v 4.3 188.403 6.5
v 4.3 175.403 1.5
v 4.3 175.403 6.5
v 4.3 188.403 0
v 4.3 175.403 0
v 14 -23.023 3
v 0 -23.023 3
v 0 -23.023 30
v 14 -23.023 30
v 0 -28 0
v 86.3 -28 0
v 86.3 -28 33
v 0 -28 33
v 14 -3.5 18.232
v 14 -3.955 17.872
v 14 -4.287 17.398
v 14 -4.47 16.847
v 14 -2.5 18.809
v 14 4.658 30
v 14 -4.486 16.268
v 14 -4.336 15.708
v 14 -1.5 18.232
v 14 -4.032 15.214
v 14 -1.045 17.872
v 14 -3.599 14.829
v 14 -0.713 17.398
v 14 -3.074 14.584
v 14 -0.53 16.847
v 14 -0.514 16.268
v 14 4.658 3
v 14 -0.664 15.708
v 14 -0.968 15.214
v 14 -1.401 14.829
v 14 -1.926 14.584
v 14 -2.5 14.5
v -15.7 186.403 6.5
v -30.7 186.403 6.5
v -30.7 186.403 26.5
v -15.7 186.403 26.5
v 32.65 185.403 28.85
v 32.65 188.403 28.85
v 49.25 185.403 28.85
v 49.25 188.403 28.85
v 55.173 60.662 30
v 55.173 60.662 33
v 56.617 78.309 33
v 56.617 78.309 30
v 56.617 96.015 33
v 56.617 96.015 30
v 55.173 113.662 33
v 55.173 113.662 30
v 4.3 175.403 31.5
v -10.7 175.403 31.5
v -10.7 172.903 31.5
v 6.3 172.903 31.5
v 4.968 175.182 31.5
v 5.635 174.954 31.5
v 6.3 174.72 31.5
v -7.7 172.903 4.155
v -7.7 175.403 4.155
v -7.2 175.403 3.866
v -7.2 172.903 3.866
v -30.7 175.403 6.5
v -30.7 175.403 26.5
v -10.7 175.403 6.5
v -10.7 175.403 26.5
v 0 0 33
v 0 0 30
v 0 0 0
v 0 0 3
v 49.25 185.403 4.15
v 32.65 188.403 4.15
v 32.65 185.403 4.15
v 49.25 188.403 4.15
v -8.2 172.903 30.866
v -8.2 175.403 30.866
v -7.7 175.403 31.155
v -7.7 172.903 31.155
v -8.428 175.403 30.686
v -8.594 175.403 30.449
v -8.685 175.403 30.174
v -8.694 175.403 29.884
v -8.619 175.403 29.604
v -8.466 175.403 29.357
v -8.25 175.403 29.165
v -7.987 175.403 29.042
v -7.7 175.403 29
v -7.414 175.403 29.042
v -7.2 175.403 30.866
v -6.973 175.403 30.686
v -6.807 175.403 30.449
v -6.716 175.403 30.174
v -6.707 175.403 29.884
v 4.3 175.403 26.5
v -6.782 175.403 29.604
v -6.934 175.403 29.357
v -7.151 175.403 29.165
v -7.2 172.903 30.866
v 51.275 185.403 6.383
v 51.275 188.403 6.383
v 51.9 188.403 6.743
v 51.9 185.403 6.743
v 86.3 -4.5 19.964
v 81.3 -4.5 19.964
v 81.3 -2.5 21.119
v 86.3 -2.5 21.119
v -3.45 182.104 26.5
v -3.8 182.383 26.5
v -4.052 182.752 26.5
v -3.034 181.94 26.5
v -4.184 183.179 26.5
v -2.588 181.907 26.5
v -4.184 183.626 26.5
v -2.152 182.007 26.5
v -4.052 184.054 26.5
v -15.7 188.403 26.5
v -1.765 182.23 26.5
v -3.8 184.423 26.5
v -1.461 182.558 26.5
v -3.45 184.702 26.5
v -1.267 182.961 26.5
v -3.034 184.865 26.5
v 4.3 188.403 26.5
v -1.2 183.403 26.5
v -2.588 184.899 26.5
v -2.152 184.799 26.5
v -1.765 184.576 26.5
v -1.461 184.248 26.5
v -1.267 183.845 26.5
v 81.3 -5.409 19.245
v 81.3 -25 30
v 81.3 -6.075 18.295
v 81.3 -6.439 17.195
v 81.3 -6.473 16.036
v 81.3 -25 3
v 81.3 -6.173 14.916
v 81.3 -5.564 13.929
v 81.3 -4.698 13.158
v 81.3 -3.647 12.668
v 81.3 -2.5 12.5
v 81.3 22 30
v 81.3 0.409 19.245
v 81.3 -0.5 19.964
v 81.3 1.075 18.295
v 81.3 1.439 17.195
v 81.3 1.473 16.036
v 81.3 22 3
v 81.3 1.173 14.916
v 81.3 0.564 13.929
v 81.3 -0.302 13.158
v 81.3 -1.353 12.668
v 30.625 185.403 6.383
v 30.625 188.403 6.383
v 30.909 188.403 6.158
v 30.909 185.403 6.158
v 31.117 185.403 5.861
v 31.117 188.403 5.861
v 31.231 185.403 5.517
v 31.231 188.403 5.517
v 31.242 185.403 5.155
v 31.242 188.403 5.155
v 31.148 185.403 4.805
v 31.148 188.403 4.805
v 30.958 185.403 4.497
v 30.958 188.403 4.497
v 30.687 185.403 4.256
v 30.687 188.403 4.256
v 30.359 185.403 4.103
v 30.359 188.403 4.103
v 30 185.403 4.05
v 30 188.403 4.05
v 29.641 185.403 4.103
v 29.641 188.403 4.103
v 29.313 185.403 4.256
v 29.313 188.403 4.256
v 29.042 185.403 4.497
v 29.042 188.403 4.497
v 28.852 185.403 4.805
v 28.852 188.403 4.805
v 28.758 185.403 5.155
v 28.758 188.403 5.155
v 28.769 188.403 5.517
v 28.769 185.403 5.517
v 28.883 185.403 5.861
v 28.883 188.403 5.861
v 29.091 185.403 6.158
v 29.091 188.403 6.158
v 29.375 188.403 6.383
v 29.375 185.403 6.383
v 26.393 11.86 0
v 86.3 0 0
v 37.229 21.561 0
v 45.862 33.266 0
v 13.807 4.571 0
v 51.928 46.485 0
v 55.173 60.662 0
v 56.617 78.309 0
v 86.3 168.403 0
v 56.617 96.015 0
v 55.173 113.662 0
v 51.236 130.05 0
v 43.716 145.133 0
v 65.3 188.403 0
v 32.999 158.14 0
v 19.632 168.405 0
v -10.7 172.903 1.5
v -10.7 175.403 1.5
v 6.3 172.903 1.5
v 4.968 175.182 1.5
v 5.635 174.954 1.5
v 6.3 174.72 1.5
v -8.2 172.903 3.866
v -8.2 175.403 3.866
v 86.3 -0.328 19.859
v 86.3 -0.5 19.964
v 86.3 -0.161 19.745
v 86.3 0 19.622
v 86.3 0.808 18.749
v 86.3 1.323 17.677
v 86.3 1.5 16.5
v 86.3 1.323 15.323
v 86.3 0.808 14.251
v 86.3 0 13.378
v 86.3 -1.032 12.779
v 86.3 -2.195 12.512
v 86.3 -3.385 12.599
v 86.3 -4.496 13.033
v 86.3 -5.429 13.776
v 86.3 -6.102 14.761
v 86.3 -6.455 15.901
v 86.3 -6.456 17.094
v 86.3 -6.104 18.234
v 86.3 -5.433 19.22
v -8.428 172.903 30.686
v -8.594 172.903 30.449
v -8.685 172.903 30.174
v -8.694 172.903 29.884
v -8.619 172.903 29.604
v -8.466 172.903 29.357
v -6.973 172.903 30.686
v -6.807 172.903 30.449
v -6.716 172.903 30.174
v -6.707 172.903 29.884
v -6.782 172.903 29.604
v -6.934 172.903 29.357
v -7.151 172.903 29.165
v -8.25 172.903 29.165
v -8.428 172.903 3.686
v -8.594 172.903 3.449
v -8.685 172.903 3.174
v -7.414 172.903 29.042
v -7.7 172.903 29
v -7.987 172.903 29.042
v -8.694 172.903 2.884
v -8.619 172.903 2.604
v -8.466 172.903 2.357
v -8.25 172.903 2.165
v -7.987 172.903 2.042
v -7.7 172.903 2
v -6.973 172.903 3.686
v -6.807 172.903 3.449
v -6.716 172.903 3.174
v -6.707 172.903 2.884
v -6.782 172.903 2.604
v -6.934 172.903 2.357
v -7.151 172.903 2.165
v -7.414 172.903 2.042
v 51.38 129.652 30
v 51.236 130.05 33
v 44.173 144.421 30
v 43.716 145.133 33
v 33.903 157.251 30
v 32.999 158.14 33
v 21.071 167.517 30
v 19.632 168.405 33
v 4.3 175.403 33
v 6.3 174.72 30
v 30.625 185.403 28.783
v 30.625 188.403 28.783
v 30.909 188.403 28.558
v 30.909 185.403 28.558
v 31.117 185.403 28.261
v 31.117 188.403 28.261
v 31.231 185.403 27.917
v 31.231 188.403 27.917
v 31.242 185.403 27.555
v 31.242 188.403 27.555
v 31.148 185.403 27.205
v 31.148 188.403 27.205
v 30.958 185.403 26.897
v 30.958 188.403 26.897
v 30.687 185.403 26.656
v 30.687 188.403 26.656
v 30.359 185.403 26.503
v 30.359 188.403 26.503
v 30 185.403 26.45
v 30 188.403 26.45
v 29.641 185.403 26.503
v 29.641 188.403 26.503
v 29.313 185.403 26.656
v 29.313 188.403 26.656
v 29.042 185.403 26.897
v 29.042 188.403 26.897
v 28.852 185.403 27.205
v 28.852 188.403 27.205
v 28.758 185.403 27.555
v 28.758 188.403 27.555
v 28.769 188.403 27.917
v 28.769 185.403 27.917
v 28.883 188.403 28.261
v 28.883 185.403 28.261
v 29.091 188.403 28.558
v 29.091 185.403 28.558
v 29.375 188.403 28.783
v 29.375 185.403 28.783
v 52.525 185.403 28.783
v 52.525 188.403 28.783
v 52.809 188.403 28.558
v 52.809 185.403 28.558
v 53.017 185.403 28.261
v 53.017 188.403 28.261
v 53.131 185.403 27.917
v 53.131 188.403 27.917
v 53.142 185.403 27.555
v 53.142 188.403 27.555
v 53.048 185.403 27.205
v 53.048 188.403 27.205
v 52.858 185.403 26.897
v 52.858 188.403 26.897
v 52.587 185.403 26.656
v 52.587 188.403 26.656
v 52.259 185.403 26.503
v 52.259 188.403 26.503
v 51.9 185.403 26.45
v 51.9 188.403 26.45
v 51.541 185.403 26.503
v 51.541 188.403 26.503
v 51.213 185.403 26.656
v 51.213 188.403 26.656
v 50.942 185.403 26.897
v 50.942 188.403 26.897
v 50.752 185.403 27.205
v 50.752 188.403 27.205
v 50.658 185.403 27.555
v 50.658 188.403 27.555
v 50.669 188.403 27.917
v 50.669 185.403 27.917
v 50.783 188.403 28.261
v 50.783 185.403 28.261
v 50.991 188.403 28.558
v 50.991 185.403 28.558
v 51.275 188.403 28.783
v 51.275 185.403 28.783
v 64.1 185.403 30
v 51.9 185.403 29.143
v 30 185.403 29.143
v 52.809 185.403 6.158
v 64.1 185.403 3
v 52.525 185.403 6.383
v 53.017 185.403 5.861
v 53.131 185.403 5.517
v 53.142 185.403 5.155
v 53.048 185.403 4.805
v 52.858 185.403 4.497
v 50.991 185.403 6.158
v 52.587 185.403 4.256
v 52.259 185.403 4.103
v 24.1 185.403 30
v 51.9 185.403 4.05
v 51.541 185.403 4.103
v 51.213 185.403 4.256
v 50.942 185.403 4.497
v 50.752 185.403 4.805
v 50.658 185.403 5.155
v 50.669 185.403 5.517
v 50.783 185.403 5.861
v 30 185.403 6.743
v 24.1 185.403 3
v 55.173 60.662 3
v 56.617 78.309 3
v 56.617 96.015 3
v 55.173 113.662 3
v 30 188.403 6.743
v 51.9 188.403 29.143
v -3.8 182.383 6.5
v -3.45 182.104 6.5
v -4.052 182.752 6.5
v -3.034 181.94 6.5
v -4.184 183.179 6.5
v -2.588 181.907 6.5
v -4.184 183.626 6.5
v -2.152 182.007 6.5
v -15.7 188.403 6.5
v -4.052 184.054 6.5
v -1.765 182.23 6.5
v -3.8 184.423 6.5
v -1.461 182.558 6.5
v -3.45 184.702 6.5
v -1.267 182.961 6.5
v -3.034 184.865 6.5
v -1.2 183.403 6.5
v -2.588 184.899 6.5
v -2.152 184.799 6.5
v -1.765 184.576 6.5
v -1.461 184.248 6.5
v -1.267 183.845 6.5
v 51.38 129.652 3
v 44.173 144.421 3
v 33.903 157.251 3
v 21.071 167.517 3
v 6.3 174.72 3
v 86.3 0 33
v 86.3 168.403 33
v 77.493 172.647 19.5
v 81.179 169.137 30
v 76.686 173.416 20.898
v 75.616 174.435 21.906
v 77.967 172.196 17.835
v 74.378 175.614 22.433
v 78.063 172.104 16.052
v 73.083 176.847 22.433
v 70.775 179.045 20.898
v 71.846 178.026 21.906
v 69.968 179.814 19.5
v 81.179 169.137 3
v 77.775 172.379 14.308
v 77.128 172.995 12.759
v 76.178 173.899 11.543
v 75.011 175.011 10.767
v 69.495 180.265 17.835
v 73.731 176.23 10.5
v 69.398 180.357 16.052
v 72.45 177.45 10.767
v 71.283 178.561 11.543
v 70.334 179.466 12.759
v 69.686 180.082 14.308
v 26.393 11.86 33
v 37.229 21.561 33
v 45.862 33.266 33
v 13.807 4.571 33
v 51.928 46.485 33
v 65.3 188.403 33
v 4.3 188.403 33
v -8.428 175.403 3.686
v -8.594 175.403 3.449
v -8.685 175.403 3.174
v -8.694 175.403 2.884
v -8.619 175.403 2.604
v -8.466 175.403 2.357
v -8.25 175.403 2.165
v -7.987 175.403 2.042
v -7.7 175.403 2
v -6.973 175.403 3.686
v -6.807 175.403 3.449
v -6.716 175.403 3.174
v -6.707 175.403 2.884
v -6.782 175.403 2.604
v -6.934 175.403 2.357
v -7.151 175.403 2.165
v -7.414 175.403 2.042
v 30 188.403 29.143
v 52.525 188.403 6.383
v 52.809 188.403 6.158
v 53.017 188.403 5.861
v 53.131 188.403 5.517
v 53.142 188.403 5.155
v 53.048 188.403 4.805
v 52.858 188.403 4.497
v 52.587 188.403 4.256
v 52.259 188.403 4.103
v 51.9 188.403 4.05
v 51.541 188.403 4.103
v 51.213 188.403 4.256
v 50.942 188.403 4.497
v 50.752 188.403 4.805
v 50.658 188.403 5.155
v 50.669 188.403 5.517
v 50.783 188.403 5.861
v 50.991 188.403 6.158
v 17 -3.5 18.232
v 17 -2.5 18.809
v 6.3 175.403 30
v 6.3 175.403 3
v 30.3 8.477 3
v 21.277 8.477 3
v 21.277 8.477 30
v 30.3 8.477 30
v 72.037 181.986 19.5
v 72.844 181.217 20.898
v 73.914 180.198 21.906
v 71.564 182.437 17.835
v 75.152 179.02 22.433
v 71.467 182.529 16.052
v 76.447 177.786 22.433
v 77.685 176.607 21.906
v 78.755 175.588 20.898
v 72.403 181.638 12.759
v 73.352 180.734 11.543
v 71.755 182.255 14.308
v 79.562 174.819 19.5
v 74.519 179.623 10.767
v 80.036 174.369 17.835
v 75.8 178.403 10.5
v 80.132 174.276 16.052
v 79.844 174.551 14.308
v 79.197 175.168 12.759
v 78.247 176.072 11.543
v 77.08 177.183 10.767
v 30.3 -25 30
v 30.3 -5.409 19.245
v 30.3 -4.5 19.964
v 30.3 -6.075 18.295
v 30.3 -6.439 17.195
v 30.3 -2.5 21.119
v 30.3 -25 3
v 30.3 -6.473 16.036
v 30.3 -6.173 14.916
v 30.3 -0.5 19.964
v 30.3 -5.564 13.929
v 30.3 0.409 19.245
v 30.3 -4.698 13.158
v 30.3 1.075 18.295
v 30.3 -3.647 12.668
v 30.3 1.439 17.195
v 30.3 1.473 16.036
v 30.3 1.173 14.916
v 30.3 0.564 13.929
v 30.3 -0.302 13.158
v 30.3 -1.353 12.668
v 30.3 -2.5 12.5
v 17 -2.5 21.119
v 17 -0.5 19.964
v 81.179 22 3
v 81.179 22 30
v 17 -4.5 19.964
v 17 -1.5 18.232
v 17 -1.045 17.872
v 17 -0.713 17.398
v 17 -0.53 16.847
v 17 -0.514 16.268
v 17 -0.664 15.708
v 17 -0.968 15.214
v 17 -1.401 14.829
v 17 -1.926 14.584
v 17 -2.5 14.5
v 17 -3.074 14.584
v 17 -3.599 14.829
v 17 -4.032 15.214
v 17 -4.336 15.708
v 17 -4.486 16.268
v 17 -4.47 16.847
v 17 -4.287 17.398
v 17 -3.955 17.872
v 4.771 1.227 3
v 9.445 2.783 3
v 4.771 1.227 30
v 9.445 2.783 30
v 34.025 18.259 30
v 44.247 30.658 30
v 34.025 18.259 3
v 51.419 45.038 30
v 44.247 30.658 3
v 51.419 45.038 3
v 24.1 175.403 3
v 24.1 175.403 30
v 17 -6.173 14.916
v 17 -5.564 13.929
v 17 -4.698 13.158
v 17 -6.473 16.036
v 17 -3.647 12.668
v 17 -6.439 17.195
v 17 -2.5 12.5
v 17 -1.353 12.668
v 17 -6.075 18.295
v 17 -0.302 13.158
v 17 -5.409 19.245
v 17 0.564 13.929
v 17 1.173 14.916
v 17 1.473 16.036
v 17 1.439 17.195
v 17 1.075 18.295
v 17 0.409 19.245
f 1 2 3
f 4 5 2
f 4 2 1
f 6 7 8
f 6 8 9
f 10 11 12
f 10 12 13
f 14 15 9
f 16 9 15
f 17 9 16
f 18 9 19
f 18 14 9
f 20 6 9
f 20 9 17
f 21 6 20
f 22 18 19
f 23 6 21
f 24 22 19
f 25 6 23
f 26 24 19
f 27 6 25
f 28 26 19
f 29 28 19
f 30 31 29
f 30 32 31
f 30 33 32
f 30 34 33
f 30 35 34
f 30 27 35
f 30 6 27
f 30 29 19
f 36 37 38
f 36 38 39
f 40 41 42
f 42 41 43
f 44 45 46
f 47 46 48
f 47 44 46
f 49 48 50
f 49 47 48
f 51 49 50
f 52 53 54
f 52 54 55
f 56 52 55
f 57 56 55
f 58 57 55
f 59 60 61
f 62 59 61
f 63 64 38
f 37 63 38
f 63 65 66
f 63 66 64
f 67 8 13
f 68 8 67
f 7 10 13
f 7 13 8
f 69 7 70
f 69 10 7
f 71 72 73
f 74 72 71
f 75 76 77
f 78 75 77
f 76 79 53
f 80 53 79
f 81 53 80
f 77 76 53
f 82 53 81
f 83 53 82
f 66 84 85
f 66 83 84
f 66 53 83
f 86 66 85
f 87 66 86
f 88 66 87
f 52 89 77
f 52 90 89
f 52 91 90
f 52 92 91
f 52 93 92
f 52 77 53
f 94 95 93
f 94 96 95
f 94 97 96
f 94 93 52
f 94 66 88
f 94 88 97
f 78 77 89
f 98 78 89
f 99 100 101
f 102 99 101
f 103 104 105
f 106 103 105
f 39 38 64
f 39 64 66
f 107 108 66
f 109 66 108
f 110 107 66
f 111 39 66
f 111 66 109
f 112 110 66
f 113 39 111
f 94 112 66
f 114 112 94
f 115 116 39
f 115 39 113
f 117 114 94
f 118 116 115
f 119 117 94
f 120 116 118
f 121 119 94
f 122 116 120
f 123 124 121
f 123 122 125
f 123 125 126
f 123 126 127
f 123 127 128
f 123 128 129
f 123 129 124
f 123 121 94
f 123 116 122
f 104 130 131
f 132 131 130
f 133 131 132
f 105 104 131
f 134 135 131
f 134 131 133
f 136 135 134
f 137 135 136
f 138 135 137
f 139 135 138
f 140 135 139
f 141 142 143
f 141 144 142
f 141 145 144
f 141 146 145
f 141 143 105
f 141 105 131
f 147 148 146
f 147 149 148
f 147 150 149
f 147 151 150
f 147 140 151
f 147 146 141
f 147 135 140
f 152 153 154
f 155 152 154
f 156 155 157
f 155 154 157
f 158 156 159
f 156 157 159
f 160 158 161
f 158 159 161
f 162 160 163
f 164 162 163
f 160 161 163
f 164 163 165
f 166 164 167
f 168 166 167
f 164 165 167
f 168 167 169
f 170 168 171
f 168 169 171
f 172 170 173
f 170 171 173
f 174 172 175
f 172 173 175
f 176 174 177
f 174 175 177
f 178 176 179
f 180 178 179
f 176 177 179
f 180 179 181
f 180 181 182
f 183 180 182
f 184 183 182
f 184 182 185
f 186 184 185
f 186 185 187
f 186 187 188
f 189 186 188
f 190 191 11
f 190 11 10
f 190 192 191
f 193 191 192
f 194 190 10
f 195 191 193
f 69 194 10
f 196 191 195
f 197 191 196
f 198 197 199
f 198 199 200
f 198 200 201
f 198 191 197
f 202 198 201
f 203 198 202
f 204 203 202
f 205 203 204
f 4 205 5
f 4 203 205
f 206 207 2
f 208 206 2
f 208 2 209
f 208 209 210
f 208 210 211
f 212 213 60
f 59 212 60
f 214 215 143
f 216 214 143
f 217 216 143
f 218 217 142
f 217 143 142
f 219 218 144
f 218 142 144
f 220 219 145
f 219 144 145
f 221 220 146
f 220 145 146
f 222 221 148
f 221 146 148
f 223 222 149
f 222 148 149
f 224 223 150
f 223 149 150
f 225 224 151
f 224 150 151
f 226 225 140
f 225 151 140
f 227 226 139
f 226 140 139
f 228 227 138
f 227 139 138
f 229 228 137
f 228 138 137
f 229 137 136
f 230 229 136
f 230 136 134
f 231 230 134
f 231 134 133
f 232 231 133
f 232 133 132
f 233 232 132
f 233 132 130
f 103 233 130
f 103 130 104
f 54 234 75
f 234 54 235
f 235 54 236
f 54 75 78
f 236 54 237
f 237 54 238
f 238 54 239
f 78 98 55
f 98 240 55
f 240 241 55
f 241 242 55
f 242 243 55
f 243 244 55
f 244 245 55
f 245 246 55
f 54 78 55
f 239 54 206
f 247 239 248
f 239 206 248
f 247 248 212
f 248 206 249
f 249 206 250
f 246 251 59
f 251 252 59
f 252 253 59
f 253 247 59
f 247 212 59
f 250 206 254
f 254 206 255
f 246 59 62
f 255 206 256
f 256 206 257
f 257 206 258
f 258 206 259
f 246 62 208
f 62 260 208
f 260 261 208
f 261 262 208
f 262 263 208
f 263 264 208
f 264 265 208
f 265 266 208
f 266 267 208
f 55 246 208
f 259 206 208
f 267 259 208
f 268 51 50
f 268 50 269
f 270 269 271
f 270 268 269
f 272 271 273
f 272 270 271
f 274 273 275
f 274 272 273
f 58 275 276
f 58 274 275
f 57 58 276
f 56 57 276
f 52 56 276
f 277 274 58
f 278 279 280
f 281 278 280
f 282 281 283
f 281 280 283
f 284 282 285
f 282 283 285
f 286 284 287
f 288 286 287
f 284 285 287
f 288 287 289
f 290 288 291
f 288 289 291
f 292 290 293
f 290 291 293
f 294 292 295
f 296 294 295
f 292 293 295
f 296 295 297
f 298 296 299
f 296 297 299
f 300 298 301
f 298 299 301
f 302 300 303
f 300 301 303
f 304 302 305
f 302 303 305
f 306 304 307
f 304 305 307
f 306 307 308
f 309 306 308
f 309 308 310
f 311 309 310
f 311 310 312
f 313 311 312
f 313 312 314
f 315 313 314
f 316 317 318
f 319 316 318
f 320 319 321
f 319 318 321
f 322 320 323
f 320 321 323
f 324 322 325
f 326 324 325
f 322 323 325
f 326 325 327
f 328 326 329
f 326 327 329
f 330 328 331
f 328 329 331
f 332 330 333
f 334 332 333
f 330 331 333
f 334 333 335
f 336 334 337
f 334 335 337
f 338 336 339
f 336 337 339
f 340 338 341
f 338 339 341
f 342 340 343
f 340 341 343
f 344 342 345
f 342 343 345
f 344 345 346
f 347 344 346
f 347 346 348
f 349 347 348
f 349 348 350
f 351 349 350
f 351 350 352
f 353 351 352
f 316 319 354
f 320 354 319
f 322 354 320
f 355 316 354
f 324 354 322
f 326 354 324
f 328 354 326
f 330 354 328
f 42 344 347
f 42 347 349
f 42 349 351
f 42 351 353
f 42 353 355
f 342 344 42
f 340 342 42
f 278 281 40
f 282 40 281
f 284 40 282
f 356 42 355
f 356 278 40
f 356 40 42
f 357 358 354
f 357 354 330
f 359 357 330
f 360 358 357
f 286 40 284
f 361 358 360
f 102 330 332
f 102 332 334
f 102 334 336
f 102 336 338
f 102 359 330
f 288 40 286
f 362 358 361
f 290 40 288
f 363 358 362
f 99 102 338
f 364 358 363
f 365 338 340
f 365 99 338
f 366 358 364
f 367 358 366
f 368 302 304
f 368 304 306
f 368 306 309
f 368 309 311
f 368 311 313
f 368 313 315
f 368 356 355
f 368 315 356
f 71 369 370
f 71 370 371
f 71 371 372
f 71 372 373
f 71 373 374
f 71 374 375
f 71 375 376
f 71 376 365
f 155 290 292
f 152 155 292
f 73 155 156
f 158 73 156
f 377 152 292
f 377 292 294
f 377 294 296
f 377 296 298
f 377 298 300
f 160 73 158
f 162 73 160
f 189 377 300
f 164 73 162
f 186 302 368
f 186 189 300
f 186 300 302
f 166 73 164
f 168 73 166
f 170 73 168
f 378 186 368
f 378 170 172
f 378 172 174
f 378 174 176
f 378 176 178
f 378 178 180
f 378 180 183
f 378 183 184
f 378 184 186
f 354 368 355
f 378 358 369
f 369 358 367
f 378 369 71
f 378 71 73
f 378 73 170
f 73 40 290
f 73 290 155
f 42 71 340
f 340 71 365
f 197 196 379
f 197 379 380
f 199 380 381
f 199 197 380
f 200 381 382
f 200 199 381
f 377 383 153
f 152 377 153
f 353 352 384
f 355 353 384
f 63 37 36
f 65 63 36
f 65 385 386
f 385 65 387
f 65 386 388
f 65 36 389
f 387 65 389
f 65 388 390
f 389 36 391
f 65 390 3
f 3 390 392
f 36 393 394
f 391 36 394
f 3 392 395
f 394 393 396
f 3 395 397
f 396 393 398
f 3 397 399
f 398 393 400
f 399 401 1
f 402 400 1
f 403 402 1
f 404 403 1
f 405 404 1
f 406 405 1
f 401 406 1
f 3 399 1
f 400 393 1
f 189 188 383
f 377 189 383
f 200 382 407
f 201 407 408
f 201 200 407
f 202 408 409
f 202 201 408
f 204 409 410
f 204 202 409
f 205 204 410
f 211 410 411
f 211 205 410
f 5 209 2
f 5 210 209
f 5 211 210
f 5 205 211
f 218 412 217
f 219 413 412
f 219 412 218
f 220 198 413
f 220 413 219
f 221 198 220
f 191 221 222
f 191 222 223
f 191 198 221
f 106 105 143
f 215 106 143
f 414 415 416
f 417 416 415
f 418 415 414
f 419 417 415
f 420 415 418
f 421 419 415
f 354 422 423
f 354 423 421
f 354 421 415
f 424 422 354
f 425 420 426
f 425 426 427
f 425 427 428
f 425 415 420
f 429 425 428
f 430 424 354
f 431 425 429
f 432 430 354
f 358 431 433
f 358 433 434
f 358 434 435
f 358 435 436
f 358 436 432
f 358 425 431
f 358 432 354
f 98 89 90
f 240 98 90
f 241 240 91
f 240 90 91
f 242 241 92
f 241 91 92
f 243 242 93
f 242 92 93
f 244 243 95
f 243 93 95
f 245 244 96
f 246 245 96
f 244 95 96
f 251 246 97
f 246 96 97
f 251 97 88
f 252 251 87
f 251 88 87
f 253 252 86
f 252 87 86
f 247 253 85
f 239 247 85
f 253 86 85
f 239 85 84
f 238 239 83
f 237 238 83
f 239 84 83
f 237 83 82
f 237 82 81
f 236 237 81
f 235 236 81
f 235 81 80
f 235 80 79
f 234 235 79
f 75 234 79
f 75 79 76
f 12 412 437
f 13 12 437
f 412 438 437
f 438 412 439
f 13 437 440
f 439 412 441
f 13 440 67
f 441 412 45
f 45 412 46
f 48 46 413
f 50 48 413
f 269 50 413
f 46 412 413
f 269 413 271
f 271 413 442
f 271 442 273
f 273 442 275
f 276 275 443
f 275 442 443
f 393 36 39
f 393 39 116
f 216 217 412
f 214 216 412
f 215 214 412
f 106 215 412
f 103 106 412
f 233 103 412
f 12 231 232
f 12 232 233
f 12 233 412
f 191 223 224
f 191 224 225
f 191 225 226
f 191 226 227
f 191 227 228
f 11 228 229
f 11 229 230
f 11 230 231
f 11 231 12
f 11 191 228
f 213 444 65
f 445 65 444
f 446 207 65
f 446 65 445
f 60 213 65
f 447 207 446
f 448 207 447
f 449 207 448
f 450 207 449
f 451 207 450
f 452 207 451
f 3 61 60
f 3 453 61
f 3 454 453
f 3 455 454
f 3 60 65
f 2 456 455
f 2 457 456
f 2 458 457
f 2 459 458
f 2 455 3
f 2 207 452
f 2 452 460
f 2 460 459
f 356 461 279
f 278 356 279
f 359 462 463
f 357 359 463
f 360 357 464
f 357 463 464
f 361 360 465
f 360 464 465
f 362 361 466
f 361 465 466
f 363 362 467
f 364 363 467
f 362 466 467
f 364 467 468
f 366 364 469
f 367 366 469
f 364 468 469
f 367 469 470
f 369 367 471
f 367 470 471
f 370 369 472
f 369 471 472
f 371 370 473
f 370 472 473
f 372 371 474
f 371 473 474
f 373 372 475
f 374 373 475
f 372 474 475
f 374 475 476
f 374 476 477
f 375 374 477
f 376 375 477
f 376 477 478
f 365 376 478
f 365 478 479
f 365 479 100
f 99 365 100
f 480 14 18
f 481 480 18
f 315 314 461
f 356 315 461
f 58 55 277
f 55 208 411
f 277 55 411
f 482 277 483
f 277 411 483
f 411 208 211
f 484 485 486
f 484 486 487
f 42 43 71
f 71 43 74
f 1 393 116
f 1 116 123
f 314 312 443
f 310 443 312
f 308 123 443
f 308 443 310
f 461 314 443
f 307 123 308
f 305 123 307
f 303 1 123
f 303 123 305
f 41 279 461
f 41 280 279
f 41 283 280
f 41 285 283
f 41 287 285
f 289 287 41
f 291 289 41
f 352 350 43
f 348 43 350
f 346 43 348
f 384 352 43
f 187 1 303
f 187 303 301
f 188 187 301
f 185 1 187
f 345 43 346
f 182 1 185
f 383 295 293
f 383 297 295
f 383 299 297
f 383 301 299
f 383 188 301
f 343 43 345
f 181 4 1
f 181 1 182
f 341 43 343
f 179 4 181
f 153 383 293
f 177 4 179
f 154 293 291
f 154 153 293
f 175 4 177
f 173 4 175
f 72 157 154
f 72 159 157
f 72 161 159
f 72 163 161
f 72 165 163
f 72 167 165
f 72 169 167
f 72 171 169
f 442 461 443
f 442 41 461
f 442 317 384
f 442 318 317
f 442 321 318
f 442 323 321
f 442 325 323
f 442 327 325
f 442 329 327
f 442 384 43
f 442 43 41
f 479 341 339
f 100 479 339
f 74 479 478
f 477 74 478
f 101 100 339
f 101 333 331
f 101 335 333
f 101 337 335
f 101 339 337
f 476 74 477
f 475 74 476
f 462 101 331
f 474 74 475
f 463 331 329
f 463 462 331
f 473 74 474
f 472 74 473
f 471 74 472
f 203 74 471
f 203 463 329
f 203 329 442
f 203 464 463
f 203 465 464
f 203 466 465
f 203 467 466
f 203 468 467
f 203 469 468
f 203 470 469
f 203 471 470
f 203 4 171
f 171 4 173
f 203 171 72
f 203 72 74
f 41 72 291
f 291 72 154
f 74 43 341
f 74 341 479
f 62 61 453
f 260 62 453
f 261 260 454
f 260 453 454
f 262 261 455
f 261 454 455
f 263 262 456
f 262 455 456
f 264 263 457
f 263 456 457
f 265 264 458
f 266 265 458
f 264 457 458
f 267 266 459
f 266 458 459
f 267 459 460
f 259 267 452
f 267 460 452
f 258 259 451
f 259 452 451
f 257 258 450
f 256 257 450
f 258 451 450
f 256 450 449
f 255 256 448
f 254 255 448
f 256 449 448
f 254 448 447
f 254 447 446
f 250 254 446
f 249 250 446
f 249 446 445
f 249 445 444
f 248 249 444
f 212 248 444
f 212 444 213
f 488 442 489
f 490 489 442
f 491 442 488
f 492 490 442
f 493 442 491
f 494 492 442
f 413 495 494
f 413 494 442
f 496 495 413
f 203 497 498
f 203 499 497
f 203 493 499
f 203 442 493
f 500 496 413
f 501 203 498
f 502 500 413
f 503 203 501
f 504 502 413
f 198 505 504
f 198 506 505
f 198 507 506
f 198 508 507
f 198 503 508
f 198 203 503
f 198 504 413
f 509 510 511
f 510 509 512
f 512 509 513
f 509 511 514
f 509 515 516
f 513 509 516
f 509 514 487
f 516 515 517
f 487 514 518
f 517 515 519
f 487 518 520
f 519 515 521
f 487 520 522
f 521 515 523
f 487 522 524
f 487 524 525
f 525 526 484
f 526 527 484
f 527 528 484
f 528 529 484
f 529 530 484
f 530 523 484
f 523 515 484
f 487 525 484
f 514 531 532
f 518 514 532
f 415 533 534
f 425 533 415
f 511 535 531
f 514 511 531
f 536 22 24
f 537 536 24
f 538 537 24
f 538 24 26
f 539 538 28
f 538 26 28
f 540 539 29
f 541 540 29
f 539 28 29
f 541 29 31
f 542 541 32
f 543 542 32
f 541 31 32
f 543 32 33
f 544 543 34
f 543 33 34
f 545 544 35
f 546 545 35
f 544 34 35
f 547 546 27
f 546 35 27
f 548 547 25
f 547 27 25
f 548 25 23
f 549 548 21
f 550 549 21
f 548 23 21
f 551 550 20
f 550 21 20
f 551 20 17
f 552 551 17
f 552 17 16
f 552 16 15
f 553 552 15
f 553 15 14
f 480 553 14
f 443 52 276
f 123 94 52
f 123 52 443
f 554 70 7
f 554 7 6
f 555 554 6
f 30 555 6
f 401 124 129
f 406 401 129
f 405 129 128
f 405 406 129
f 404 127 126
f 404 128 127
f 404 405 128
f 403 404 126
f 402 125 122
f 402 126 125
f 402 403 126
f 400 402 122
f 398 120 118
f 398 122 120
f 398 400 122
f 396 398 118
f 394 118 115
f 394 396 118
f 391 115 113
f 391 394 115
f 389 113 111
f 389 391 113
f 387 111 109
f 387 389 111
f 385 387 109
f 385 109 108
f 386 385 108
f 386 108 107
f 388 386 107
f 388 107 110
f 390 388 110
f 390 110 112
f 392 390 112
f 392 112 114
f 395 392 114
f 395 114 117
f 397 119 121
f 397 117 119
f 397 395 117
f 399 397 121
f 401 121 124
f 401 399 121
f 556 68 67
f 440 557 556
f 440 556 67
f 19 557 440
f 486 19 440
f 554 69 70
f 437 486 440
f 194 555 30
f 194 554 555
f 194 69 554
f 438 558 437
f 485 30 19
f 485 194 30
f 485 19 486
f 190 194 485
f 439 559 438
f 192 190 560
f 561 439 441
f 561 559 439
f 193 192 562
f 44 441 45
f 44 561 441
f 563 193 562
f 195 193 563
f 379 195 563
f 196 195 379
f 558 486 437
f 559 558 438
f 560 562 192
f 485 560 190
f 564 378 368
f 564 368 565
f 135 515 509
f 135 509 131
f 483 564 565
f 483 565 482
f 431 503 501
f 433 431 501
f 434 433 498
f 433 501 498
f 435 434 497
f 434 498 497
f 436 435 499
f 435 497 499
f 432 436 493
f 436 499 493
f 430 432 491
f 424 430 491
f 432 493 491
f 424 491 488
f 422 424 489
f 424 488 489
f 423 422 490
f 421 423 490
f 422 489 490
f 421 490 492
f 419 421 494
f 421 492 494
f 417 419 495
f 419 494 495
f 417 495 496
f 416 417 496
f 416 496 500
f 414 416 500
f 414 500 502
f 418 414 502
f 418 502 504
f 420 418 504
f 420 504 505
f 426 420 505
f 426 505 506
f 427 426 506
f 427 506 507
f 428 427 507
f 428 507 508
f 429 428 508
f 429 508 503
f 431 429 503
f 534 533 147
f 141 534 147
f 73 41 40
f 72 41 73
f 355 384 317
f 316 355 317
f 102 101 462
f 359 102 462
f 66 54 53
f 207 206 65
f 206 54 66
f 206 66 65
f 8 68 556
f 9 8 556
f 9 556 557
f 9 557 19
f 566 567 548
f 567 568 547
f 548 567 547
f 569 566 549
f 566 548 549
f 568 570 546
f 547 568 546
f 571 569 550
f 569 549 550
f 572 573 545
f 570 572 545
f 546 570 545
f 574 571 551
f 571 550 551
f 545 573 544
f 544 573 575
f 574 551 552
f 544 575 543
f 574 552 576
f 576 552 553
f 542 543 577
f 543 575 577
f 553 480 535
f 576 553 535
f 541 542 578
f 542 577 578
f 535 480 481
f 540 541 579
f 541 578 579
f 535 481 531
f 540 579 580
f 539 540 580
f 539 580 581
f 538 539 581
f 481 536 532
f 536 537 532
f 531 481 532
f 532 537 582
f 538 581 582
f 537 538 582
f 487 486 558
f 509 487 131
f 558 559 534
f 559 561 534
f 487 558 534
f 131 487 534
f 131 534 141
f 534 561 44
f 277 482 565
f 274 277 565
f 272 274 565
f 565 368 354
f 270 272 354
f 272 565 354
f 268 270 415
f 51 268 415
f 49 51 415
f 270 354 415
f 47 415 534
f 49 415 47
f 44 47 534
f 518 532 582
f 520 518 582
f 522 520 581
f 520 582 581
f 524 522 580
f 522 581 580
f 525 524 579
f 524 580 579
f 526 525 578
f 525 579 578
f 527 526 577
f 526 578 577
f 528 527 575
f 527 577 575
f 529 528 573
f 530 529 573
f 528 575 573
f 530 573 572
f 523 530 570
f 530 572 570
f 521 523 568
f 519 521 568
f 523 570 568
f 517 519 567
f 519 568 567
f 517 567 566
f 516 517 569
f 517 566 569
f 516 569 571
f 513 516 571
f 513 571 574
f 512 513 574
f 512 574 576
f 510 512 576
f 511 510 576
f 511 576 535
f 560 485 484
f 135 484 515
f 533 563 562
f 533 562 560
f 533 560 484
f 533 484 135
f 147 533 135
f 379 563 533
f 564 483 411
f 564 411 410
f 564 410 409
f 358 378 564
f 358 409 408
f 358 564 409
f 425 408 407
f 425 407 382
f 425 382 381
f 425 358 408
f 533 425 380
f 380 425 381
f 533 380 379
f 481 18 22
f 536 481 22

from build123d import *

# Parameters (mm, degrees)
EXTRUDE_6_DEPTH      = 33
CUT_EXTRUDE_START    = 3
CUT_EXTRUDE_2_DEPTH  = 27
EXTRUDE_START        = 6.5
SKETCH_7_W           = 35
SKETCH_7_H           = 13
EXTRUDE_7_DEPTH      = 20
EXTRUDE_START_2      = 1.5
SKETCH_11_W          = 17
SKETCH_11_H          = 2.5
EXTRUDE_15_DEPTH     = 30
CUT_EXTRUDE_START_2  = 180
CUT_EXTRUDE_3_DEPTH  = 10
SKETCH_13_R          = 1.5
CUT_EXTRUDE_4_DEPTH  = 30
SKETCH_14_W          = 15
SKETCH_14_H          = 2
CUT_EXTRUDE_5_DEPTH  = 30
EXTRUDE_START_3      = 11.5
SKETCH_15_W          = 67.299618531
SKETCH_15_H          = 10
EXTRUDE_16_DEPTH     = 10
CUT_EXTRUDE_START_3  = 17
CUT_EXTRUDE_7_DEPTH  = 75
CUT_EXTRUDE_START_4  = 13
CUT_EXTRUDE_9_DEPTH  = 5
SKETCH_20_W          = 16.6
SKETCH_20_H          = 24.7
CUT_EXTRUDE_10_DEPTH = 5
SKETCH_21_R          = 6
CUT_EXTRUDE_11_DEPTH = 5
SKETCH_22_W          = 51
SKETCH_22_H          = 47
CUT_EXTRUDE_12_DEPTH = 27


with BuildPart() as part:
    # Эскиз1 → Бобышка-Вытянуть6 (new body)
    with BuildSketch(Plane.XY):
        with BuildLine():
            Line((4.299618531, 175.402841826), (4.299618531, 188.402841826))
            Line((4.299618531, 188.402841826), (65.299618531, 188.402841826))
            Line((65.299618531, 188.402841826), (86.299618531, 168.402841826))
            Line((86.299618531, 168.402841826), (86.299619, 0))
            Line((86.299619, 0), (86.299619, -28))
            Line((86.299619, -28), (0, -28))
            Line((0, -28), (0, 0))
            ThreePointArc((0, 0), (37.229295141, 21.561020186), (55.173142182, 60.662380285))
            ThreePointArc((55.173142182, 60.662380285), (56.797307883, 87.162380285), (55.173142182, 113.662380285))
            ThreePointArc((55.173142182, 113.662380285), (38.726552267, 151.940422917), (4.299618531, 175.402841826))
        make_face()
    extrude(amount=EXTRUDE_6_DEPTH)

    # Эскиз5 → Вырез-Вытянуть2 (cut)
    with BuildSketch(Plane.XY.offset(CUT_EXTRUDE_START)):
        Polygon((24.099618531, 175.402841826), (4.299618531, 175.402841826), (4.299618531, 169.136823089), (-18.700381469, 169.136823089), (-18.700381469, -23.02337805), (14, -23.02337805), (14, 8.47662195), (81.178938205, 8.47662195), (81.178938205, 169.136823089), (64.099618531, 185.402841826), (24.099618531, 185.402841826), align=None)
    extrude(amount=CUT_EXTRUDE_2_DEPTH, mode=Mode.SUBTRACT)

    # Эскиз7 → Бобышка-Вытянуть7 (add)
    with BuildSketch(Plane.XY.offset(EXTRUDE_START)):
        with Locations((-13.200381469, 181.902841826)):
            Rectangle(SKETCH_7_W, SKETCH_7_H)
    extrude(amount=EXTRUDE_7_DEPTH)

    # Эскиз11 → Бобышка-Вытянуть15 (add)
    with BuildSketch(Plane.XY.offset(EXTRUDE_START_2)):
        with Locations((-2.200381469, 174.152841826)):
            Rectangle(SKETCH_11_W, SKETCH_11_H)
    extrude(amount=EXTRUDE_15_DEPTH)

    # Эскиз12 → Вырез-Вытянуть3 (cut)
    with BuildSketch(Plane(origin=(0, 0, 0), x_dir=(1, 0, 0), z_dir=(0, 1, 0)).offset(CUT_EXTRUDE_START_2)):
        with BuildLine():
            Line((-7.700381469, -31.154700538), (-7.200381469, -30.866025404))
            ThreePointArc((-7.200381469, -30.866025404), (-7.700381469, -29), (-8.200381469, -30.866025404))
            Line((-8.200381469, -30.866025404), (-7.700381469, -31.154700538))
        make_face()
        with BuildLine():
            Line((-7.700381469, -4.154700538), (-7.200381469, -3.866025404))
            ThreePointArc((-7.200381469, -3.866025404), (-7.700381469, -2), (-8.200381469, -3.866025404))
            Line((-8.200381469, -3.866025404), (-7.700381469, -4.154700538))
        make_face()
    extrude(amount=-CUT_EXTRUDE_3_DEPTH, mode=Mode.SUBTRACT)

    # Эскиз13 → Вырез-Вытянуть4 (cut)
    with BuildSketch(Plane.XY):
        with Locations((-2.700381469, 183.402841826)):
            Circle(SKETCH_13_R)
    extrude(amount=CUT_EXTRUDE_4_DEPTH, mode=Mode.SUBTRACT)

    # Эскиз14 → Вырез-Вытянуть5 (cut)
    with BuildSketch(Plane.XY):
        with Locations((-23.200381469, 187.402841826)):
            Rectangle(SKETCH_14_W, SKETCH_14_H)
    extrude(amount=CUT_EXTRUDE_5_DEPTH, mode=Mode.SUBTRACT)

    # Эскиз15 → Бобышка-Вытянуть16 (add)
    with BuildSketch(Plane.XY.offset(EXTRUDE_START_3)):
        with Locations((47.649809735, -2.5)):
            Rectangle(SKETCH_15_W, SKETCH_15_H)
    extrude(amount=EXTRUDE_16_DEPTH)

    # Эскиз17 → Вырез-Вытянуть7 (cut)
    with BuildSketch(Plane(origin=(0, 0, 0), x_dir=(0, 0, -1), z_dir=(1, 0, 0)).offset(CUT_EXTRUDE_START_3)):
        with BuildLine():
            Line((-21.118802154, -2.5), (-19.964101615, -0.5))
            ThreePointArc((-19.964101615, -0.5), (-12.5, -2.5), (-19.964101615, -4.5))
            Line((-19.964101615, -4.5), (-21.118802154, -2.5))
        make_face()
    extrude(amount=CUT_EXTRUDE_7_DEPTH, mode=Mode.SUBTRACT)

    # Эскиз18 → Вырез-Вытянуть9 (cut)
    with BuildSketch(Plane(origin=(0, 0, 0), x_dir=(0, 0, -1), z_dir=(1, 0, 0)).offset(CUT_EXTRUDE_START_4)):
        with BuildLine():
            Line((-18.809401077, -2.5), (-18.232050808, -1.5))
            ThreePointArc((-18.232050808, -1.5), (-14.5, -2.5), (-18.232050808, -3.5))
            Line((-18.232050808, -3.5), (-18.809401077, -2.5))
        make_face()
    extrude(amount=CUT_EXTRUDE_9_DEPTH, mode=Mode.SUBTRACT)

    # Эскиз20 → Вырез-Вытянуть10 (cut)
    with BuildSketch(Plane(origin=(0, 188.402841826, 0), x_dir=(1, 0, 0), z_dir=(0, 1, 0))):
        with Locations((40.95, -16.5)):
            Rectangle(SKETCH_20_W, SKETCH_20_H)
        with BuildLine():
            Line((30, -29.143375673), (30.625, -28.782531755))
            ThreePointArc((30.625, -28.782531755), (30, -26.45), (29.375, -28.782531755))
            Line((29.375, -28.782531755), (30, -29.143375673))
        make_face()
        with BuildLine():
            Line((30, -6.743375673), (30.625, -6.382531755))
            ThreePointArc((30.625, -6.382531755), (30, -4.05), (29.375, -6.382531755))
            Line((29.375, -6.382531755), (30, -6.743375673))
        make_face()
        with BuildLine():
            Line((51.9, -6.743375673), (52.525, -6.382531755))
            ThreePointArc((52.525, -6.382531755), (51.9, -4.05), (51.275, -6.382531755))
            Line((51.275, -6.382531755), (51.9, -6.743375673))
        make_face()
        with BuildLine():
            Line((51.9, -29.143375673), (52.525, -28.782531755))
            ThreePointArc((52.525, -28.782531755), (51.9, -26.45), (51.275, -28.782531755))
            Line((51.275, -28.782531755), (51.9, -29.143375673))
        make_face()
    extrude(amount=-CUT_EXTRUDE_10_DEPTH, mode=Mode.SUBTRACT)

    # Эскиз21 → Вырез-Вытянуть11 (cut)
    with BuildSketch(Plane(origin=(125.147492247, 131.404866859, 0), x_dir=(0, 0, -1), z_dir=(0.689655172, 0.724137931, 0))):
        with Locations((-16.5, 68.147063703)):
            Circle(SKETCH_21_R)
    extrude(amount=-CUT_EXTRUDE_11_DEPTH, mode=Mode.SUBTRACT)

    # Эскиз22 → Вырез-Вытянуть12 (cut)
    with BuildSketch(Plane.XY.offset(CUT_EXTRUDE_START)):
        with Locations((55.799619, -1.5)):
            Rectangle(SKETCH_22_W, SKETCH_22_H)
    extrude(amount=CUT_EXTRUDE_12_DEPTH, mode=Mode.SUBTRACT)


solid = part.part
